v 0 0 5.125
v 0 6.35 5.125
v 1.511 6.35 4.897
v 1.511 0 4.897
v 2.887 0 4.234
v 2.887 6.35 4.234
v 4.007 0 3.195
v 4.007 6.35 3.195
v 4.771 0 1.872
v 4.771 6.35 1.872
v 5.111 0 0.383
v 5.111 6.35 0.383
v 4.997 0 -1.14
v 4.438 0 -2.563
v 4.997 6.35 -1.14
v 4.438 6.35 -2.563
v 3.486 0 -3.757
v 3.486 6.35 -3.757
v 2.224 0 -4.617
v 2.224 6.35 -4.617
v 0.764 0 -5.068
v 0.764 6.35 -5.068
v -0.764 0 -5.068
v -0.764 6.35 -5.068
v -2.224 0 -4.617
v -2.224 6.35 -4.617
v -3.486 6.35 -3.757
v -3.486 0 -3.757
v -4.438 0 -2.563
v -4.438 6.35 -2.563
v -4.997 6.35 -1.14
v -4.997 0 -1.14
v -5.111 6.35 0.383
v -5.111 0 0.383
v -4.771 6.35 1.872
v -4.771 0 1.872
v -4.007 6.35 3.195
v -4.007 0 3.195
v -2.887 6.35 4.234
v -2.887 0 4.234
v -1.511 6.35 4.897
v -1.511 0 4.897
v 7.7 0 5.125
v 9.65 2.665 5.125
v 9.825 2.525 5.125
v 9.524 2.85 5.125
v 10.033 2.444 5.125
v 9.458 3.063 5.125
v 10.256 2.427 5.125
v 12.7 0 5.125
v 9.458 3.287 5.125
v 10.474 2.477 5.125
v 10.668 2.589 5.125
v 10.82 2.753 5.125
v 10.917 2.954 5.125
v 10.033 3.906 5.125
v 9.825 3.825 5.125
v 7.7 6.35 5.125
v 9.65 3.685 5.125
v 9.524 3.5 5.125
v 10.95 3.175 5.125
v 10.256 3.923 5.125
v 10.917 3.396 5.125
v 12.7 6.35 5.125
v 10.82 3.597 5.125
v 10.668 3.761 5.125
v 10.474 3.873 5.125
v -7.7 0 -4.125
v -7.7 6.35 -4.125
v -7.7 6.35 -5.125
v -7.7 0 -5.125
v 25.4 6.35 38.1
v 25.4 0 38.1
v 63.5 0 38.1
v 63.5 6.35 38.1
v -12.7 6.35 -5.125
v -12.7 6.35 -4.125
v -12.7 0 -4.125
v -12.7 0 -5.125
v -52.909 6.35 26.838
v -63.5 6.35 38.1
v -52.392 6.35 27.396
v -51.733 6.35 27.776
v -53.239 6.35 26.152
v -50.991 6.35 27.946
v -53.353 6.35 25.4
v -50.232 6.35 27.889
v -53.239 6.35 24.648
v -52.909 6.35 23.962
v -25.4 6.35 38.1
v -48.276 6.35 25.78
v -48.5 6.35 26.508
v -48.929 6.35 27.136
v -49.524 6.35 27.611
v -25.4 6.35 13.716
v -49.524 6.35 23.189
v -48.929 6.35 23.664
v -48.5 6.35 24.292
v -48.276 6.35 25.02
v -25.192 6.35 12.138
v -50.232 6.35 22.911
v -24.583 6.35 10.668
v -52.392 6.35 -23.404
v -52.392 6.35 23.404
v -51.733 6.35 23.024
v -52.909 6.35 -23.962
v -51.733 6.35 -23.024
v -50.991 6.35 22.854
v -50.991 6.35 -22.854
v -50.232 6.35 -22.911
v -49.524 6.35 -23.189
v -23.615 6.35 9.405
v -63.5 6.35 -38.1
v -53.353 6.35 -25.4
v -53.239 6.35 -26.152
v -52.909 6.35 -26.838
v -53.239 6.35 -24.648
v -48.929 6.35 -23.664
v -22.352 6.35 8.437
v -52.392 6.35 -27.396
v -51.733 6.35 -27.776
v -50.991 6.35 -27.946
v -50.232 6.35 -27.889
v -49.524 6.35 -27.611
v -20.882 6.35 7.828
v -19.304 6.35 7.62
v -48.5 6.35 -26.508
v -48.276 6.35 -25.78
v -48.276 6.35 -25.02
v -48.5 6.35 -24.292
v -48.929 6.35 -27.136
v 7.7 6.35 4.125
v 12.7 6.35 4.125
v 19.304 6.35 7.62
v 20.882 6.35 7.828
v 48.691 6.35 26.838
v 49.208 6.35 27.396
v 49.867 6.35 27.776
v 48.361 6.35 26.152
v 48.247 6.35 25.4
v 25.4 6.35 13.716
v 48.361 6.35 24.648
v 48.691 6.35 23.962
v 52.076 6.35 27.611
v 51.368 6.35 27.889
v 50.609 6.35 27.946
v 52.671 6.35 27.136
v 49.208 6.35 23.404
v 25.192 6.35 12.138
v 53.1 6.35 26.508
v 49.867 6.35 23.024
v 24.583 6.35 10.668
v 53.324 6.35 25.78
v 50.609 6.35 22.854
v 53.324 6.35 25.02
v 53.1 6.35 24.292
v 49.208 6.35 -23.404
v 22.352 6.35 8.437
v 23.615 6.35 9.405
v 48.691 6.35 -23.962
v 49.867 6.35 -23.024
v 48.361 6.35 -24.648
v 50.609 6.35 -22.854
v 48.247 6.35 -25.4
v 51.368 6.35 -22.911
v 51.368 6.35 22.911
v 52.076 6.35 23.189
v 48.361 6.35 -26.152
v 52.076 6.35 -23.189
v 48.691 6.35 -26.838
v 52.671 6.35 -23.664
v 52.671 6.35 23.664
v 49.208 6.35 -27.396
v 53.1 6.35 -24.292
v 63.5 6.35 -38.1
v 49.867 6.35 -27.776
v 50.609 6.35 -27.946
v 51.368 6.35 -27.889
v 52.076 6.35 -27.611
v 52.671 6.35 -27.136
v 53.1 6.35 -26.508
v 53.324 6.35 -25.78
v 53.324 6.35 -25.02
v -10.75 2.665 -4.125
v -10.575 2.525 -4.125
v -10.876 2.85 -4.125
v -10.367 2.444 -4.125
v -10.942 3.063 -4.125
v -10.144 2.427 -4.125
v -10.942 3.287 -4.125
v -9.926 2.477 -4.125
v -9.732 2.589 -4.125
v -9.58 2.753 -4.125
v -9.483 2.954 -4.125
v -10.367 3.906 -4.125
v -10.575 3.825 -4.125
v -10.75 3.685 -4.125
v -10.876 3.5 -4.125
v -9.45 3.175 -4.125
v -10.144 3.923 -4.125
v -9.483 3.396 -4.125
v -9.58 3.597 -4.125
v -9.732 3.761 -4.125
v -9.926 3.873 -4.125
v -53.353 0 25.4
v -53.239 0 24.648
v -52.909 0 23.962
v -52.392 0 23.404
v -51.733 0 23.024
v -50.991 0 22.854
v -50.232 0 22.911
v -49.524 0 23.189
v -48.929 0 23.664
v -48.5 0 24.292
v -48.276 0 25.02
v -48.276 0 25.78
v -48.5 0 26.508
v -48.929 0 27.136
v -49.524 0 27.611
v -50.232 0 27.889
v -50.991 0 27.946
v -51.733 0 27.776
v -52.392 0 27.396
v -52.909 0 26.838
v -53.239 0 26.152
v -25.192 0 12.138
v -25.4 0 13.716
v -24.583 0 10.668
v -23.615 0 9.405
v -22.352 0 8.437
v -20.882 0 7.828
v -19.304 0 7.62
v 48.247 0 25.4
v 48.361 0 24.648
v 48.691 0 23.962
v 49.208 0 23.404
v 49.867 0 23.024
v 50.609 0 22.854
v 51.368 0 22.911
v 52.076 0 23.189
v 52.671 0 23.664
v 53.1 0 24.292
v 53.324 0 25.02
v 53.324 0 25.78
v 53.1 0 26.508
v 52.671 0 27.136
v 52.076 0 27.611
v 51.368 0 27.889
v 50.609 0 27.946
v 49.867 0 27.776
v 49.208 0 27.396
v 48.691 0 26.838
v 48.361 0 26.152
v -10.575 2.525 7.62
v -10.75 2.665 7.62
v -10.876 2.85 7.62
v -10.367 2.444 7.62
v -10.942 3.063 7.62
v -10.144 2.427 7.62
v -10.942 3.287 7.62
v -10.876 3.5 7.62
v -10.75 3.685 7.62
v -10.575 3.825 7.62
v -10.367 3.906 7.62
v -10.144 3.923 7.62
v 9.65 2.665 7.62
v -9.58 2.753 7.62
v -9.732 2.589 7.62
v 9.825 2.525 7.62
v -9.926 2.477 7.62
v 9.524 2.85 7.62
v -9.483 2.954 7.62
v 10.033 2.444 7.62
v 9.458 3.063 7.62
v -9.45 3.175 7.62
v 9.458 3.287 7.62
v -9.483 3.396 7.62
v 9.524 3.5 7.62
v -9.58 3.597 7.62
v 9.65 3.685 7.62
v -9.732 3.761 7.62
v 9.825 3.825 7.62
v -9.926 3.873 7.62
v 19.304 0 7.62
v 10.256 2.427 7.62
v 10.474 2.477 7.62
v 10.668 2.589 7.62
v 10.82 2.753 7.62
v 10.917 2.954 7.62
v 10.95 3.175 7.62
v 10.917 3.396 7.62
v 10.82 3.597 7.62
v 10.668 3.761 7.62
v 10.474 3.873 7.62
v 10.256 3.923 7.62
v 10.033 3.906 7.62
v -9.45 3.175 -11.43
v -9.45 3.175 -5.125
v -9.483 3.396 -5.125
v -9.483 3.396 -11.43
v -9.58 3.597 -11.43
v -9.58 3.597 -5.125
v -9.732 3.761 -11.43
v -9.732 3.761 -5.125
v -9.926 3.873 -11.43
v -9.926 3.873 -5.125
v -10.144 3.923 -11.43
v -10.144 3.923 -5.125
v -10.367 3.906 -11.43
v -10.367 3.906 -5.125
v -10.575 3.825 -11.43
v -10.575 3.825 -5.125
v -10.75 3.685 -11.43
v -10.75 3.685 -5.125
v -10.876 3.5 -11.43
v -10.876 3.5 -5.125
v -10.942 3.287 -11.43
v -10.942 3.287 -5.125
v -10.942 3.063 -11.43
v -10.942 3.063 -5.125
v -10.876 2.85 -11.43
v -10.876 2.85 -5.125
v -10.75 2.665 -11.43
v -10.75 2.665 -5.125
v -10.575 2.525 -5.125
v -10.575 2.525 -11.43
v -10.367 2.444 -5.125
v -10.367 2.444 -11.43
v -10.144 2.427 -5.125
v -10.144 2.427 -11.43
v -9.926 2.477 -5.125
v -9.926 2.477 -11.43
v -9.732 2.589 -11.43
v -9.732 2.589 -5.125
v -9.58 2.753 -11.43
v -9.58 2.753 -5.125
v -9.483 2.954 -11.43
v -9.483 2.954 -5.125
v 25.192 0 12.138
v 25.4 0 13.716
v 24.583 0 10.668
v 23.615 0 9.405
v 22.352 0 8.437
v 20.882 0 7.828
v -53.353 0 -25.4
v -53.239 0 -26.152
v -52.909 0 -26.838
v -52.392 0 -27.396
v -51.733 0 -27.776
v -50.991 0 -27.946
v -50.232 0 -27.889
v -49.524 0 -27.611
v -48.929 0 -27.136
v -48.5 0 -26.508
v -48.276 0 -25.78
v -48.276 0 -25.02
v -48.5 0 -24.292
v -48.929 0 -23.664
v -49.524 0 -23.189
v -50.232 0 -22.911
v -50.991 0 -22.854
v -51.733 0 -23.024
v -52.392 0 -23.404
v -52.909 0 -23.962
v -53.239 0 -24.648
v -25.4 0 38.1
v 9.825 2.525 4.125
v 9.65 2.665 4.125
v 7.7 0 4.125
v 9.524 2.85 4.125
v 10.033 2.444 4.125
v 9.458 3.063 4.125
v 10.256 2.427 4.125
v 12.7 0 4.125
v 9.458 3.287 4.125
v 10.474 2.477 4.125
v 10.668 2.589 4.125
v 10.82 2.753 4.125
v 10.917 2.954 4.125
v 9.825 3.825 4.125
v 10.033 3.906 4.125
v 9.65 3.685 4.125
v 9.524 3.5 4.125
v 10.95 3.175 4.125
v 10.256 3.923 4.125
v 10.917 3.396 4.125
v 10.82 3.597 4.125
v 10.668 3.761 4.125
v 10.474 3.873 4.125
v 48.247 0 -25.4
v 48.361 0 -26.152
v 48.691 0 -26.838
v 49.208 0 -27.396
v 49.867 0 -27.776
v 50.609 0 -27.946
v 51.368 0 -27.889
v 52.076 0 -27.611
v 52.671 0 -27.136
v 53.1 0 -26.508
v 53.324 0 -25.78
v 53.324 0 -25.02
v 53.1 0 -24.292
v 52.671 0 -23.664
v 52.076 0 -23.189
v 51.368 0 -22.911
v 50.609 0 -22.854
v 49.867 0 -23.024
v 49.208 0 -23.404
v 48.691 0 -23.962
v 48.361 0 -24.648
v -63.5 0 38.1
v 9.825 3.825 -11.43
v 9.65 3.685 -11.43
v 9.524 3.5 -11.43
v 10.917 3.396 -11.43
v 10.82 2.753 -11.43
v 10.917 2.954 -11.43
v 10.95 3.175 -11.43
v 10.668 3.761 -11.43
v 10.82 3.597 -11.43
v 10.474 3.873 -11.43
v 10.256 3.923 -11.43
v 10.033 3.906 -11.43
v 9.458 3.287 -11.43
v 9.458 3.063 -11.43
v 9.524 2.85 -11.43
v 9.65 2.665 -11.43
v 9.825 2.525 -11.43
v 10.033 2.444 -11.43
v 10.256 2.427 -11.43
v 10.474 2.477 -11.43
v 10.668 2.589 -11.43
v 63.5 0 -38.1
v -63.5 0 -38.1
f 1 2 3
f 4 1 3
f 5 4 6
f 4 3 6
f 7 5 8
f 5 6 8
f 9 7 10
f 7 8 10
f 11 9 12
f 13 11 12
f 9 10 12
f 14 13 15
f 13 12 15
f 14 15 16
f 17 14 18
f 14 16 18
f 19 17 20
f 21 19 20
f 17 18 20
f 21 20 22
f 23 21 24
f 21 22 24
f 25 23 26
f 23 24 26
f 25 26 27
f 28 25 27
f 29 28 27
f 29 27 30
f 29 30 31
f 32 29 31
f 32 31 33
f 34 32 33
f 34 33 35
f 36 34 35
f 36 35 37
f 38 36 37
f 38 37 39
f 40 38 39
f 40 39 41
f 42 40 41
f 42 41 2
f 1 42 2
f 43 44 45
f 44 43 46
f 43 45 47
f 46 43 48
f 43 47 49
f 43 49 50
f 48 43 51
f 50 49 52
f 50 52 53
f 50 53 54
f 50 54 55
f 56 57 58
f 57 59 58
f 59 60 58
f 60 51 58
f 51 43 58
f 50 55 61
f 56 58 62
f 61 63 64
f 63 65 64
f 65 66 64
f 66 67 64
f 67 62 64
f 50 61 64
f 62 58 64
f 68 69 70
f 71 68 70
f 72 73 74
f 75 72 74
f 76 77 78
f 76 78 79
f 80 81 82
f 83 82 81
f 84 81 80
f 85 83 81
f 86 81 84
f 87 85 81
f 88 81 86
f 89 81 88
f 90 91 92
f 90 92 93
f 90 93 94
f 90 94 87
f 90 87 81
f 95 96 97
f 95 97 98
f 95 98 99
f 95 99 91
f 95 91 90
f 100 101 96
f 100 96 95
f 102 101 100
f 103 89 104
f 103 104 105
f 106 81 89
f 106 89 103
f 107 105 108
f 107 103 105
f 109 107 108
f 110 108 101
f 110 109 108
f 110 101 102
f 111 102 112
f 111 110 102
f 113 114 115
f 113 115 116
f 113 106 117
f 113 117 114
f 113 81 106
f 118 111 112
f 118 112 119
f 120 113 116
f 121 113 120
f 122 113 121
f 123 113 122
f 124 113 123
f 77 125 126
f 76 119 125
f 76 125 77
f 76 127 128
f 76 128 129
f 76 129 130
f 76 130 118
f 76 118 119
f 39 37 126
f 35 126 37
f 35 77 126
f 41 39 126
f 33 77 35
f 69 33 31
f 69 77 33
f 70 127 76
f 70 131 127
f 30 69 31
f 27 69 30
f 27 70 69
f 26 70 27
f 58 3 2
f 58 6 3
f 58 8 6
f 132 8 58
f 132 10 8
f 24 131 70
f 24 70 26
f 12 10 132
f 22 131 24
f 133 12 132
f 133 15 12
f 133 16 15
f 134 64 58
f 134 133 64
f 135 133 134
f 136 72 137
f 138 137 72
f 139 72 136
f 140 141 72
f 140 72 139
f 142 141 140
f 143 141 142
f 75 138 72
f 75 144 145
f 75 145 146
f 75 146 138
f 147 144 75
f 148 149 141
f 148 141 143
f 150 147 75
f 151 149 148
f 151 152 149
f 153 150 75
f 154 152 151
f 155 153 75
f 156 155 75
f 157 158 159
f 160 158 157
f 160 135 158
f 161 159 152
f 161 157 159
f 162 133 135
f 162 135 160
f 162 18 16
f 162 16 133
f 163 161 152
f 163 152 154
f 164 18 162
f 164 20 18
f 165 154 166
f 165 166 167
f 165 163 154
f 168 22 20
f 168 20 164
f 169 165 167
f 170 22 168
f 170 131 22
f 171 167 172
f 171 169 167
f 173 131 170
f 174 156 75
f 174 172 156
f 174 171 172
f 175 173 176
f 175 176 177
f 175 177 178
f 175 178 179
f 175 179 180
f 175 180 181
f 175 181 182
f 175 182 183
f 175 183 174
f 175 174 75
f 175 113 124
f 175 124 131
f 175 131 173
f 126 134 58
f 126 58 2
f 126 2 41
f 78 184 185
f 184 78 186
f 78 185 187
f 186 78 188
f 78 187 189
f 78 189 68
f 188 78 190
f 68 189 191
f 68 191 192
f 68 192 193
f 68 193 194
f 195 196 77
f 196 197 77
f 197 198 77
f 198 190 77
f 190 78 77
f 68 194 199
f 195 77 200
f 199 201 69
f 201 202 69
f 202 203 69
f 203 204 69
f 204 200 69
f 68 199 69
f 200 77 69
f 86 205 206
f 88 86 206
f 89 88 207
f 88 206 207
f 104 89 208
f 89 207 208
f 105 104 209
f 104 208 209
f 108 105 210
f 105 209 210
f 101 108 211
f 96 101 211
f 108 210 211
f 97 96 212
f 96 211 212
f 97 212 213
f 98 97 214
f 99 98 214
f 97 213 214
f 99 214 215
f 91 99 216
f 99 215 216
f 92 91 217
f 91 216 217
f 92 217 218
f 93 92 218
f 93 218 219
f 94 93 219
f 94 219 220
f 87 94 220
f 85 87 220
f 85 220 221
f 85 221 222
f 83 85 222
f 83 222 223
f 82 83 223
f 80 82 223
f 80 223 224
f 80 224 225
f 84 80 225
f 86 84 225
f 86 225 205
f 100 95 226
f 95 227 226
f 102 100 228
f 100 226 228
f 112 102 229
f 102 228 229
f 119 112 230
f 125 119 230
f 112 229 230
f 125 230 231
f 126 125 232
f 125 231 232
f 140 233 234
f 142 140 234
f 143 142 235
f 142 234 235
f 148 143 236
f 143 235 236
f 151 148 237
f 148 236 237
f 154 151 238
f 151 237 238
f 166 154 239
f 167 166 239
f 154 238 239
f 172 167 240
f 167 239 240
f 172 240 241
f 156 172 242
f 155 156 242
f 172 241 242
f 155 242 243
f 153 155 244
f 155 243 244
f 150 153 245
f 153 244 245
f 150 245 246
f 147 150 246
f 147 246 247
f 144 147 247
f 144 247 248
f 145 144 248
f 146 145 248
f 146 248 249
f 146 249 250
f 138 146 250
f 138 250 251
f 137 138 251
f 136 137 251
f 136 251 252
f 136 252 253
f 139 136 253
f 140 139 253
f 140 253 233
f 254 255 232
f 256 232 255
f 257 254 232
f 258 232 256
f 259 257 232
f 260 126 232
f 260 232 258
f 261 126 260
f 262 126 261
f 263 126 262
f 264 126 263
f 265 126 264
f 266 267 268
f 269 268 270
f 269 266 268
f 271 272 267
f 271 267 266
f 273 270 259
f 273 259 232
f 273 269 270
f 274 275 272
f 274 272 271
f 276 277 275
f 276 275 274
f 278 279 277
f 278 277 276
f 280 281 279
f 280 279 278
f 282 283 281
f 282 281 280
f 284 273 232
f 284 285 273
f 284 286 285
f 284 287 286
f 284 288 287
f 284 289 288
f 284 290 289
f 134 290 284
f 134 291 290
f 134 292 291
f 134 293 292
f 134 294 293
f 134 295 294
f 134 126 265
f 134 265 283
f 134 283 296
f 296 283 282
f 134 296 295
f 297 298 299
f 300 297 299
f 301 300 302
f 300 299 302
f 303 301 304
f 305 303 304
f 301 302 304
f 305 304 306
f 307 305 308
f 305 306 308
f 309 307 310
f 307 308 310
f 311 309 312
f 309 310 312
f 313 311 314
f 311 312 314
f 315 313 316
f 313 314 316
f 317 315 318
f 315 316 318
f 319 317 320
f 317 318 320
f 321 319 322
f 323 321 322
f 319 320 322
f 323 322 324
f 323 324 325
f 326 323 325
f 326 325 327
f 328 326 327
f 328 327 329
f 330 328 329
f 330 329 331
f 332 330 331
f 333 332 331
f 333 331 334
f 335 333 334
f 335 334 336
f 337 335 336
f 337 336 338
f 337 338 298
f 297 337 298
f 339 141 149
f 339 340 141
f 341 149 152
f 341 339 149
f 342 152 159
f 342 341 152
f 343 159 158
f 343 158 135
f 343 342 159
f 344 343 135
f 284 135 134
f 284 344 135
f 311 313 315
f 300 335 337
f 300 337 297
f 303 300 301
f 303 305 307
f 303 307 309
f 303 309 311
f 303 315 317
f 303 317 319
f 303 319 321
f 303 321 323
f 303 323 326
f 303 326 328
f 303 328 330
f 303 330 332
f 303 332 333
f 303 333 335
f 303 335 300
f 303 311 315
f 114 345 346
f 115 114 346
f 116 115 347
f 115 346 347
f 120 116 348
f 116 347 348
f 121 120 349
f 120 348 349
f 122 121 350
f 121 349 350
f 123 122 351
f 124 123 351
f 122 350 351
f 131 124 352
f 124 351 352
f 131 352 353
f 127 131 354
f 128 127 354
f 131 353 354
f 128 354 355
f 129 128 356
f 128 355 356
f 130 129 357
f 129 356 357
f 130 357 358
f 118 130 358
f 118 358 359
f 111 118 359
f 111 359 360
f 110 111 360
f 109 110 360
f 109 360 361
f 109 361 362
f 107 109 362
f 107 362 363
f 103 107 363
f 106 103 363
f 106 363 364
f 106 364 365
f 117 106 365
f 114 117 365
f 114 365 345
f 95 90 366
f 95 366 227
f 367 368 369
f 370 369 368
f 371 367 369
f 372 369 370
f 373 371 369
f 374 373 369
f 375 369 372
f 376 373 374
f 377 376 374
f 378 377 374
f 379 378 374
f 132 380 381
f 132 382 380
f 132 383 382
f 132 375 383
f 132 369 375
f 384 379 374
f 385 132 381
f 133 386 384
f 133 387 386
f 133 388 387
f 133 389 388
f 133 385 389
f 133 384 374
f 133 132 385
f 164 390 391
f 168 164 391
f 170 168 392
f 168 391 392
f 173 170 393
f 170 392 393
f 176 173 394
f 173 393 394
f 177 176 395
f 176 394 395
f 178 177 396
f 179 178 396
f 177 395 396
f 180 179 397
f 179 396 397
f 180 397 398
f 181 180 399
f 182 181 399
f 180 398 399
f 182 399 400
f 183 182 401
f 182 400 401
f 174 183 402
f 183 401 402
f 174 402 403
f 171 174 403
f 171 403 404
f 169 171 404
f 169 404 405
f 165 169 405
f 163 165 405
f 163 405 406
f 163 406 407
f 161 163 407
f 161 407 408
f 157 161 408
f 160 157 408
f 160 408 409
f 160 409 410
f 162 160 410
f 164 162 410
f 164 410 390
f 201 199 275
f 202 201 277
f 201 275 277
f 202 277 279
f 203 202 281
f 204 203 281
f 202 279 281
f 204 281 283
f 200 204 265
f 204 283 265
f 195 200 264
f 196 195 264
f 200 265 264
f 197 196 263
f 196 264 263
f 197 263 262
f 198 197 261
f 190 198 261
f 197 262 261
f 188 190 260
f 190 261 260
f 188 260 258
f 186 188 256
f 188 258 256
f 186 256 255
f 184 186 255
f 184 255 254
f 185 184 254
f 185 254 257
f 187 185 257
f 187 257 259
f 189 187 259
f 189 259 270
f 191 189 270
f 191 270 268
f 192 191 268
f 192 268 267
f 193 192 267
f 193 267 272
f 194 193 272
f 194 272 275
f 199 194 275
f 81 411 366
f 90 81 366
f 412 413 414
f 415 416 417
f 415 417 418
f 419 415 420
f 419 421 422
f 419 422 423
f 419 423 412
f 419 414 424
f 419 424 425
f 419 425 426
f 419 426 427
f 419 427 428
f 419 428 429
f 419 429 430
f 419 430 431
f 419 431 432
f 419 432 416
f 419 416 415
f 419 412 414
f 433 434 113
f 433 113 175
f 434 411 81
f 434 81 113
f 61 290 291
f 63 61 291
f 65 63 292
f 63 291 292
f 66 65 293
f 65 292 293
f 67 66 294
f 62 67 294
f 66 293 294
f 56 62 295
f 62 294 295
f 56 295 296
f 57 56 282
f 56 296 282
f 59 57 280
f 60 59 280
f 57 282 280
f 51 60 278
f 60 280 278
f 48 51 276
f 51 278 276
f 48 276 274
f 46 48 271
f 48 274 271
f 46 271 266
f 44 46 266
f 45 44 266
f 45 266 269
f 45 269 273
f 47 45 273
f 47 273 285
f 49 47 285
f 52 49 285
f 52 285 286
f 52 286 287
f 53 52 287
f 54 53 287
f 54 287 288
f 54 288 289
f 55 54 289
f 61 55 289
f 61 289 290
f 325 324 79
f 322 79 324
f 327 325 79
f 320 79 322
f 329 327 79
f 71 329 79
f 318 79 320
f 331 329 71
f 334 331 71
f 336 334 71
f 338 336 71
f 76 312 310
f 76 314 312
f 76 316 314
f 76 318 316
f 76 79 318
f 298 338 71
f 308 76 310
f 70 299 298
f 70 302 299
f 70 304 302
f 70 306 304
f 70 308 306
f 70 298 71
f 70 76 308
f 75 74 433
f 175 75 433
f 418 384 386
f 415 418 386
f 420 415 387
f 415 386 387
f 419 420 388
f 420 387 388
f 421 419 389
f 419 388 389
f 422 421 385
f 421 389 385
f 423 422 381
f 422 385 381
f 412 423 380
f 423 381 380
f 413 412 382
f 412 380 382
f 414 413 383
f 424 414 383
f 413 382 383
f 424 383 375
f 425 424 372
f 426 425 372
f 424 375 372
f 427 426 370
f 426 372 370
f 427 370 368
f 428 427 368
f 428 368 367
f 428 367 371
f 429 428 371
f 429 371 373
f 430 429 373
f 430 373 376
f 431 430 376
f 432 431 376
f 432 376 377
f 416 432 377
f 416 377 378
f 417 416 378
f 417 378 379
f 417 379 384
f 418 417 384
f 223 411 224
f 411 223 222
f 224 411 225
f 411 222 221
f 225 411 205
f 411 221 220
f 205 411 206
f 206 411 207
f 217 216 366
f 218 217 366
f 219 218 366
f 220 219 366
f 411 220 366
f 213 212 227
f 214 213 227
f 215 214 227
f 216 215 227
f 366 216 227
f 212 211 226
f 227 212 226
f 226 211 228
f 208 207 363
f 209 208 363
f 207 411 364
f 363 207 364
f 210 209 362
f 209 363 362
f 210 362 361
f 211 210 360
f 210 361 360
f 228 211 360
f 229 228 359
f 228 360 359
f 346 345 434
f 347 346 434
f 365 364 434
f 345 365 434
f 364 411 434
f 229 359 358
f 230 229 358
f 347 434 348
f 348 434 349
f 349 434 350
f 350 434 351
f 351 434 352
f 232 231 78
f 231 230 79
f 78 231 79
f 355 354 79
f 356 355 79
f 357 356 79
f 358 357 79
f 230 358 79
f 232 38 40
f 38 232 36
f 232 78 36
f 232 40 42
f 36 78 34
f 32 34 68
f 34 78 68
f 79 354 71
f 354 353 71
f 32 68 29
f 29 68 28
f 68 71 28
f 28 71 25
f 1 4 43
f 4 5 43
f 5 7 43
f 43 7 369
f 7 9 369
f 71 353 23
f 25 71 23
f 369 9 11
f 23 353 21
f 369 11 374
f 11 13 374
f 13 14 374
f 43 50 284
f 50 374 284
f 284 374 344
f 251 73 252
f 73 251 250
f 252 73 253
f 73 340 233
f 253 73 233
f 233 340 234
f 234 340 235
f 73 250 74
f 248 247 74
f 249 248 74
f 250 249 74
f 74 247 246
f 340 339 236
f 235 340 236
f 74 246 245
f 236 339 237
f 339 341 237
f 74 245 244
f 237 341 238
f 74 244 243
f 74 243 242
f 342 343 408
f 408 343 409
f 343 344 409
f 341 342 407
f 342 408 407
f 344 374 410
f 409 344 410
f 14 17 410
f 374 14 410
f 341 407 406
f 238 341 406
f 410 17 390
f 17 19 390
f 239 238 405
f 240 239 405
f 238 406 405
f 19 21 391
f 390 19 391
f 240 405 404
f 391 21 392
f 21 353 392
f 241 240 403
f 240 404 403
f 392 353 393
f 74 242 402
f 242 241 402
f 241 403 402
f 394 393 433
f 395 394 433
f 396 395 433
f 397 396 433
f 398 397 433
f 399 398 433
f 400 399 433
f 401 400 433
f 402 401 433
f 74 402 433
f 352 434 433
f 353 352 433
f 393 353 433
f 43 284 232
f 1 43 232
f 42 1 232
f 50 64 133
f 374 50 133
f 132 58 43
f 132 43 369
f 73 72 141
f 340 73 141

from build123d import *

# Parameters (mm, degrees)
SKETCH1_W               = 127
SKETCH1_H               = 76.2
BOSS_EXTRUDE1_DEPTH     = 6.35
SKETCH3_R               = 5.125
SKETCH3_W               = 50.8
SKETCH3_H               = 30.48
SKETCH3_W_2             = 5
SKETCH3_H_2             = 1
CUT_EXTRUDE1_DEPTH      = 75.324844433
FILLET1_R               = 6.096
SKETCH4_R               = 0.75
CUT_EXTRUDE2_DEPTH      = 19.05
F_1_4_20_TAPPED_HOLE1_D = 5.1054


with BuildPart() as part:
    # Sketch1 → Boss-Extrude1 (new body)
    with BuildSketch(Plane(origin=(0, 0, 0), x_dir=(1, 0, 0), z_dir=(0, 1, 0))):
        Rectangle(SKETCH1_W, SKETCH1_H)
    extrude(amount=BOSS_EXTRUDE1_DEPTH)

    # Sketch3 → Cut-Extrude1 (cut, through all)
    with BuildSketch(Plane(origin=(0, 6.35, 0), x_dir=(1, 0, 0), z_dir=(0, 1, 0))):
        with Locations(Location((0, 0, 0), (0, 0, 270))):
            Circle(SKETCH3_R)
        with Locations((0, -22.86)):
            Rectangle(SKETCH3_W, SKETCH3_H)
        with Locations((10.2, -4.625)):
            Rectangle(SKETCH3_W_2, SKETCH3_H_2)
        with Locations((-10.2, 4.625)):
            Rectangle(SKETCH3_W_2, SKETCH3_H_2)
    extrude(amount=-CUT_EXTRUDE1_DEPTH, mode=Mode.SUBTRACT)

    # Fillet1
    fillet1_edges = [part.edges().sort_by_distance(p)[0] for p in [
        (-25.4, 3.175, 7.62),
        (25.4, 3.175, 7.62),
    ]]
    fillet(fillet1_edges, radius=FILLET1_R)

    # Sketch4 → Cut-Extrude2 (cut)
    with BuildSketch(Plane.XY.offset(7.62)):
        with Locations((-10.2, 3.175)):
            Circle(SKETCH4_R)
        with Locations((10.2, 3.175)):
            Circle(SKETCH4_R)
    extrude(amount=-CUT_EXTRUDE2_DEPTH, mode=Mode.SUBTRACT)

    # 1/4-20 Tapped Hole1 (through all)
    with Locations(Plane(origin=(0, 6.35, 0), x_dir=(1, 0, 0), z_dir=(0, 1, 0))):
        with Locations((-50.8, 25.4), (50.8, 25.4), (50.8, -25.4), (-50.8, -25.4)):
            Hole(F_1_4_20_TAPPED_HOLE1_D / 2)


solid = part.part
